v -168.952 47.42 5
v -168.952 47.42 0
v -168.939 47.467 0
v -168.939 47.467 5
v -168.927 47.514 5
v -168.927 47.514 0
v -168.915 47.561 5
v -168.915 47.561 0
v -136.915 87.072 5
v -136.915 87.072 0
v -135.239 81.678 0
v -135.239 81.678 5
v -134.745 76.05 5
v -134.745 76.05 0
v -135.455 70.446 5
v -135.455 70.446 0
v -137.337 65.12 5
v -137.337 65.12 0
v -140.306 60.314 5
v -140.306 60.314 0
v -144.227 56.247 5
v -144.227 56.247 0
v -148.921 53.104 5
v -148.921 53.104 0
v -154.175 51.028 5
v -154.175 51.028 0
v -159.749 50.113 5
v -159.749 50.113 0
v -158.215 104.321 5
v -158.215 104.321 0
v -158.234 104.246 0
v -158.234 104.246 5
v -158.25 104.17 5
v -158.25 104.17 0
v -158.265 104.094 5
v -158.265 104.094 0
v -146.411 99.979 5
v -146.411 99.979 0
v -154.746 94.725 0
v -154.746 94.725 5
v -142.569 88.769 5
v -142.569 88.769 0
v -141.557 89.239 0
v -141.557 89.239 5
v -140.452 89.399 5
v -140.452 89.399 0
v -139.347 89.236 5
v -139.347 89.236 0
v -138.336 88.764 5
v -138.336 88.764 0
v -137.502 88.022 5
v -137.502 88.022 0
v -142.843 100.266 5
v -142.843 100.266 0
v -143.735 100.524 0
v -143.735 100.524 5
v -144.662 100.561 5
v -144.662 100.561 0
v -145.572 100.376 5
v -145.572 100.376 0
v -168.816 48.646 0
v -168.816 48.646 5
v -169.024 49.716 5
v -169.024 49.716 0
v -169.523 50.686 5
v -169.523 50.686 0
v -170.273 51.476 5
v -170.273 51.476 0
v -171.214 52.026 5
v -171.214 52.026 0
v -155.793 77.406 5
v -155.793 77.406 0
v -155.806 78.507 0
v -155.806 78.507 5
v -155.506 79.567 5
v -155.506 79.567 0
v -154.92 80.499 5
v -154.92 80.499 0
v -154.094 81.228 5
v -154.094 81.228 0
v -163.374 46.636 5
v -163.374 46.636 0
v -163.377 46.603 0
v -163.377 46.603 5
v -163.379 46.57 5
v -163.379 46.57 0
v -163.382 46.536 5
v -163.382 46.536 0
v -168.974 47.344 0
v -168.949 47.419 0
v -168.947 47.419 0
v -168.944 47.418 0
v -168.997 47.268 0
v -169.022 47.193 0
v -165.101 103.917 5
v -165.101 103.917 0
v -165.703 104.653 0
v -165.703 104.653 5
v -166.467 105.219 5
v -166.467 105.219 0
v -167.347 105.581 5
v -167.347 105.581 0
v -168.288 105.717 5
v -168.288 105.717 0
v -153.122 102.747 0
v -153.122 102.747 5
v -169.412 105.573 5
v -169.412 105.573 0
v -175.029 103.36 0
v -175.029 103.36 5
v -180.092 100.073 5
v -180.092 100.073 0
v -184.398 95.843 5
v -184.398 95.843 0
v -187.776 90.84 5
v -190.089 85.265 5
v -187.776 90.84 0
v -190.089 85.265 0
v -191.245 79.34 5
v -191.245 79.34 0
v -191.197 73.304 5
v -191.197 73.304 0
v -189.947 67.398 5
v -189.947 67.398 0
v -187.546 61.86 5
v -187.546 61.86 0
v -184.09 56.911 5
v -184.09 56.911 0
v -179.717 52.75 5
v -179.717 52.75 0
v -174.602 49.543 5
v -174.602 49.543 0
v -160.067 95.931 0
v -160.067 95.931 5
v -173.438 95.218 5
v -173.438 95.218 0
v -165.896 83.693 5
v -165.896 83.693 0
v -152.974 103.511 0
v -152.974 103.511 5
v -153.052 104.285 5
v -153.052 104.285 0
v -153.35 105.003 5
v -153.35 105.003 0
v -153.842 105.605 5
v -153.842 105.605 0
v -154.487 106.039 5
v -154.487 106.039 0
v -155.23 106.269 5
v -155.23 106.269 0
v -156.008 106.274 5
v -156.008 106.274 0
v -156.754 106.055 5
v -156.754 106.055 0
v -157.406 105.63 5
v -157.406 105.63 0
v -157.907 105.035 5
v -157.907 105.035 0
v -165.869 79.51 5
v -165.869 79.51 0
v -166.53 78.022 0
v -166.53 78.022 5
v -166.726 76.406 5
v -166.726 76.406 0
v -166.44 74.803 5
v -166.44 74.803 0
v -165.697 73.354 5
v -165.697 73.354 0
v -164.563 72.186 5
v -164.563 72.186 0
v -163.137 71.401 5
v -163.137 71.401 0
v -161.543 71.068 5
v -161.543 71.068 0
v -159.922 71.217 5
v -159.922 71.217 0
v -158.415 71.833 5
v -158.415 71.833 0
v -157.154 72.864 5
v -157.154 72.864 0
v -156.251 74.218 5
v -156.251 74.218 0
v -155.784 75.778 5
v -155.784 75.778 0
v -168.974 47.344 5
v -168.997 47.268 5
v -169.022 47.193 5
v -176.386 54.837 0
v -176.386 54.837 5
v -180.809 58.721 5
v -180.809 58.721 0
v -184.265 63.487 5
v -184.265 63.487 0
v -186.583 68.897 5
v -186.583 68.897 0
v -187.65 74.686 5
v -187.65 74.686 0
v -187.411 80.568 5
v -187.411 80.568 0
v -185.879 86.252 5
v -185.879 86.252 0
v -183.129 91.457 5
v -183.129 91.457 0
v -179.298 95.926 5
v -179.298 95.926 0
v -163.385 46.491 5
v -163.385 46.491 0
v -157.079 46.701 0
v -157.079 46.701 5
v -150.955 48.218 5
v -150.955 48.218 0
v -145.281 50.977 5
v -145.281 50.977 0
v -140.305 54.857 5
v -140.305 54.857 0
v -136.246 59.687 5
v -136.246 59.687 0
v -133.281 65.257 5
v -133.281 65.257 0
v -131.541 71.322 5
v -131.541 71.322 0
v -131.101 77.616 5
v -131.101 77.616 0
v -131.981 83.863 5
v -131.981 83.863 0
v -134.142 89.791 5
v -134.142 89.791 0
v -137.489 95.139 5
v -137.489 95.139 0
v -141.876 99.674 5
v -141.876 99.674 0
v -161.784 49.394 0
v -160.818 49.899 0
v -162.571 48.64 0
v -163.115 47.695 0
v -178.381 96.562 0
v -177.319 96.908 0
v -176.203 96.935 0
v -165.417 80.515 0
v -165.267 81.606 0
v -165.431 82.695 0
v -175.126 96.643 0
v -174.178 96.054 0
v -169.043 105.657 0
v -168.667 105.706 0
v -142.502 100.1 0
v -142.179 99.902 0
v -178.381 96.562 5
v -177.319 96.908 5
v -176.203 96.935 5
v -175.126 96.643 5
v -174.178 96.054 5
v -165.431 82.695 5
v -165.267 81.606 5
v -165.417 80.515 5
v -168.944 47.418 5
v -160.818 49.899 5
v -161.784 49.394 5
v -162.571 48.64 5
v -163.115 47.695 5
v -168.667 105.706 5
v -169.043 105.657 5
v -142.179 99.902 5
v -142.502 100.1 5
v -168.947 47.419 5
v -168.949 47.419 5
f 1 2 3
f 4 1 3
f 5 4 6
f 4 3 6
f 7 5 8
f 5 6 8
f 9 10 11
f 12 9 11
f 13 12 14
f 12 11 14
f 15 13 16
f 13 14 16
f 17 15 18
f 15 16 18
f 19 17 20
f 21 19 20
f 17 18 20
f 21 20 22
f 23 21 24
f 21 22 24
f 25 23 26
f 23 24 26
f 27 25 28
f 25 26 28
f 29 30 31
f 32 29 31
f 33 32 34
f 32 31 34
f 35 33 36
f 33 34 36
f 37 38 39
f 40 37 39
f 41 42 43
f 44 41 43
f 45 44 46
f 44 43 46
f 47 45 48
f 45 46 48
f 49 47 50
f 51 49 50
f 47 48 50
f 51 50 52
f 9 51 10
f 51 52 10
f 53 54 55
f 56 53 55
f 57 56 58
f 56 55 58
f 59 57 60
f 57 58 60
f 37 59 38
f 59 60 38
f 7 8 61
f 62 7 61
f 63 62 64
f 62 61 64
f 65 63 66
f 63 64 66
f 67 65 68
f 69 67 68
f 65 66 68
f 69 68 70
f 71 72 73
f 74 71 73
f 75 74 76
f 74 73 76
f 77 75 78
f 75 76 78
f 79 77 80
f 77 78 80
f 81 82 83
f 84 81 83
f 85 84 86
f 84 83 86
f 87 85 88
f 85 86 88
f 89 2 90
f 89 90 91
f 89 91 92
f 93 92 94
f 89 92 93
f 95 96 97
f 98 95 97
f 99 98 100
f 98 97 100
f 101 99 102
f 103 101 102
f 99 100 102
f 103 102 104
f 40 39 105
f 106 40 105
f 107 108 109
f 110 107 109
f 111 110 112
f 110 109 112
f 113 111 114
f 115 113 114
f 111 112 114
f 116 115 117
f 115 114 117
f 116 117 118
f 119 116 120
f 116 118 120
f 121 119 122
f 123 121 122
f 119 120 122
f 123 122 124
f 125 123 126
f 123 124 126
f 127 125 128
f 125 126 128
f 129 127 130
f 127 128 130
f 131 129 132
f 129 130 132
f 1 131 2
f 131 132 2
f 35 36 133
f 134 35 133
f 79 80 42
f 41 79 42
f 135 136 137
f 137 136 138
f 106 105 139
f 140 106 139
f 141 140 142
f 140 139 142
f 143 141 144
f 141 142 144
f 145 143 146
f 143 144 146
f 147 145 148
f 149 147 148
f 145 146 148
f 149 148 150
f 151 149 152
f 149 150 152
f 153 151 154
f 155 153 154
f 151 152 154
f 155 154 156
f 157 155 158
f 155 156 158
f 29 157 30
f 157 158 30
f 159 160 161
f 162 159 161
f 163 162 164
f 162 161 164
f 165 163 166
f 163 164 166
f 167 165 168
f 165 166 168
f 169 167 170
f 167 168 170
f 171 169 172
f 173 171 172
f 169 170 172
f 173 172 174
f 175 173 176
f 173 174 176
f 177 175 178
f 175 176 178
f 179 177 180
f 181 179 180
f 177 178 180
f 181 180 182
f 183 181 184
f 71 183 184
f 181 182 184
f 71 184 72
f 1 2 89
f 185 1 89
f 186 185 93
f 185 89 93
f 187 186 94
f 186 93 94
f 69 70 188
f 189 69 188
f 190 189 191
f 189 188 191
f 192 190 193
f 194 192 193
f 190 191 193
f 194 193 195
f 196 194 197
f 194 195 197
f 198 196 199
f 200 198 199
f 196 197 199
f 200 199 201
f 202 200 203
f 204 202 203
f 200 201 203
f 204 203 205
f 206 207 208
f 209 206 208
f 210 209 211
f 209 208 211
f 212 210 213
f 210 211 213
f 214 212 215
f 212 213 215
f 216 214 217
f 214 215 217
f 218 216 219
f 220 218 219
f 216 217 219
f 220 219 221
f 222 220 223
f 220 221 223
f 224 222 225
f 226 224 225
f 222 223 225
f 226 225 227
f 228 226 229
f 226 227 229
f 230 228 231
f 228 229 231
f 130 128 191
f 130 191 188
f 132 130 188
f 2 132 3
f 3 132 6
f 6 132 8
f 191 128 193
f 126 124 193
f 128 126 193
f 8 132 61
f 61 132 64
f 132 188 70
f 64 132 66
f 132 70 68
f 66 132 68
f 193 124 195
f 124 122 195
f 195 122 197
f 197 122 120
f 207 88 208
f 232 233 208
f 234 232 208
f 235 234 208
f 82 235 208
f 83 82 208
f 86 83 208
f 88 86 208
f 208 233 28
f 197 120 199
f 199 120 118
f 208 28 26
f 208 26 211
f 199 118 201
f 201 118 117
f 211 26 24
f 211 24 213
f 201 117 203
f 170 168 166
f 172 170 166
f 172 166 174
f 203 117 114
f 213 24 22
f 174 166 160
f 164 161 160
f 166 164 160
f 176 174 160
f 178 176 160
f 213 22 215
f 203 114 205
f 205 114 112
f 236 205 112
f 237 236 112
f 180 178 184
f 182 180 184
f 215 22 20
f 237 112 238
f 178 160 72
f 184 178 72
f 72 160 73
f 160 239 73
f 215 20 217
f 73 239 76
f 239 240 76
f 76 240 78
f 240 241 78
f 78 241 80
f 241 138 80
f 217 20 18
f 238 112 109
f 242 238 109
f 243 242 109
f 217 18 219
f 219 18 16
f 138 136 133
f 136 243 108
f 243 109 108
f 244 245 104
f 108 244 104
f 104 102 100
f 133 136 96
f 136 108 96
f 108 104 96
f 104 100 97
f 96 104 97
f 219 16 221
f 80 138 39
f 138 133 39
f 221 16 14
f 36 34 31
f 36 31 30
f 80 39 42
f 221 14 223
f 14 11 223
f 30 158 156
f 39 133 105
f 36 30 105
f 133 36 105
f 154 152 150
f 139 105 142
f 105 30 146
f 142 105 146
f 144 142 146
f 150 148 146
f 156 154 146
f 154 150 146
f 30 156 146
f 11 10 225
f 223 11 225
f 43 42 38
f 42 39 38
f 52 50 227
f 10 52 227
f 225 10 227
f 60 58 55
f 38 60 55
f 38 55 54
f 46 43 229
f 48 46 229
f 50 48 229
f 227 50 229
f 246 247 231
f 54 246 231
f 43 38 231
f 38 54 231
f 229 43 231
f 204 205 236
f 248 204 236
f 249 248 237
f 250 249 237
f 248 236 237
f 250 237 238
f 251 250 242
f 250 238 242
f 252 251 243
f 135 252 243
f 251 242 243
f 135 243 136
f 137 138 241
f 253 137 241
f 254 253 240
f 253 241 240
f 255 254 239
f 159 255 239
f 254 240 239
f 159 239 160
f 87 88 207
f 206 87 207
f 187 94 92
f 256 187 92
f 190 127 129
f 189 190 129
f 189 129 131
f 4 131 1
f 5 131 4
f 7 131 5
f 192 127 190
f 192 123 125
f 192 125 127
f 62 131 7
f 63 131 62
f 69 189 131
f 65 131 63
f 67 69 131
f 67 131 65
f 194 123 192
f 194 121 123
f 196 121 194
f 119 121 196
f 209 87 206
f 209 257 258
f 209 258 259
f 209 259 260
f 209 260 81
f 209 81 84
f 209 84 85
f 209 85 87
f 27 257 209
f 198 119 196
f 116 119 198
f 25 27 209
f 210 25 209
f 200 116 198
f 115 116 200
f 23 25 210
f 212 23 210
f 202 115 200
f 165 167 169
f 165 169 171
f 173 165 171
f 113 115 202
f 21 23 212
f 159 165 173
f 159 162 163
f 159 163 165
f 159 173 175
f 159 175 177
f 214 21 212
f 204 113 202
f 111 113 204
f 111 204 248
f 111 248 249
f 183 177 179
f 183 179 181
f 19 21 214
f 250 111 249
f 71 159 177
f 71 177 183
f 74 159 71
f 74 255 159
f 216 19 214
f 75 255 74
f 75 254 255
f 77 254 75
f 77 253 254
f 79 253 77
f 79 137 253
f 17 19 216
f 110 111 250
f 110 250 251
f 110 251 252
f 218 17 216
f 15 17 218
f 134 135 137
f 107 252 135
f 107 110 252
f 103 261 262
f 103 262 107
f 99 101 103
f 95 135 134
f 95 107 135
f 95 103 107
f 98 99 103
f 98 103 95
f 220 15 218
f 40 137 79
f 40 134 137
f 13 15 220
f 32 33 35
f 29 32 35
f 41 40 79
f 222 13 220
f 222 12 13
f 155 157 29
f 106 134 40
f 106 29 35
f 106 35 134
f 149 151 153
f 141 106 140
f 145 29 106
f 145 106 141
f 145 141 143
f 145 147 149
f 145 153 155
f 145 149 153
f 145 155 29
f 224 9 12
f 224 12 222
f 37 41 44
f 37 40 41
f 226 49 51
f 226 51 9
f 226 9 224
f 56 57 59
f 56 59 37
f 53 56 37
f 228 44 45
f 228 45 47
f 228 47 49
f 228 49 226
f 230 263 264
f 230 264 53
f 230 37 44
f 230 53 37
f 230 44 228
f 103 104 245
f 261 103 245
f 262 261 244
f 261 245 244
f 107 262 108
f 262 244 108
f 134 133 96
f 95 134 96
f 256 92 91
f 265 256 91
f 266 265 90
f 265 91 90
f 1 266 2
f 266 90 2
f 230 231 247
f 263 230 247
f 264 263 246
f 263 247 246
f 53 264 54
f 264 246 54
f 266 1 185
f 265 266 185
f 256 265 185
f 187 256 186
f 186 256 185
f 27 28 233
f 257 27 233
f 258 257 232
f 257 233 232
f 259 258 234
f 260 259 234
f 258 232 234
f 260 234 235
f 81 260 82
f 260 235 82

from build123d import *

# Parameters (mm, degrees)
F1_DEPTH = 5


with BuildPart() as f1:
    # F0 (on Top) → F1 (new body)
    with BuildSketch(Plane.XY):
        with BuildLine():
            Line((-163.381988, 46.536467), (-163.385242, 46.491124))
            ThreePointArc((-163.385242, 46.491124), (-133.281303, 65.256861), (-141.876481, 99.673761))
            ThreePointArc((-141.876481, 99.673761), (-142.337813, 100.005423), (-142.842853, 100.265736))
            ThreePointArc((-142.842853, 100.265736), (-133.210619, 65.833675), (-163.373536, 46.636144))
            ThreePointArc((-163.373536, 46.636144), (-163.378085, 46.586333), (-163.381988, 46.536467))
        make_face()
        with BuildLine():
            ThreePointArc((-168.9444, 47.418202), (-168.947955, 47.419144), (-168.951509, 47.420086))
            ThreePointArc((-168.951509, 47.420086), (-168.985109, 47.305972), (-169.022211, 47.192949))
            Line((-169.022211, 47.192949), (-168.9444, 47.418202))
        make_face()
        with BuildLine():
            ThreePointArc((-163.373536, 46.636144), (-133.210619, 65.833675), (-142.842853, 100.265736))
            ThreePointArc((-142.842853, 100.265736), (-144.661973, 100.561266), (-146.410639, 99.979284))
            Line((-146.410639, 99.979284), (-154.74582, 94.725046))
            Line((-154.74582, 94.725046), (-153.122208, 102.747463))
            ThreePointArc((-153.122208, 102.747463), (-154.850541, 106.181119), (-158.214688, 104.321107))
            Line((-158.214688, 104.321107), (-158.264877, 104.093805))
            Line((-158.264877, 104.093805), (-160.067137, 95.931475))
            Line((-160.067137, 95.931475), (-165.100747, 103.916657))
            ThreePointArc((-165.100747, 103.916657), (-166.467338, 105.218717), (-168.288042, 105.716684))
            ThreePointArc((-168.288042, 105.716684), (-191.226027, 76.882824), (-168.915222, 47.560978))
            ThreePointArc((-168.915222, 47.560978), (-169.238771, 50.218734), (-171.214242, 52.025904))
            ThreePointArc((-171.214242, 52.025904), (-187.277826, 71.762209), (-179.298415, 95.926014))
            ThreePointArc((-179.298415, 95.926014), (-176.203345, 96.935434), (-173.437857, 95.217742))
            Line((-173.437857, 95.217742), (-165.89632, 83.693394))
            ThreePointArc((-165.89632, 83.693394), (-165.266574, 81.605971), (-165.868951, 79.510486))
            ThreePointArc((-165.868951, 79.510486), (-162.352429, 71.175522), (-155.793288, 77.405707))
            ThreePointArc((-155.793288, 77.405707), (-155.506415, 79.567101), (-154.093685, 81.227856))
            Line((-154.093685, 81.227856), (-142.569337, 88.769393))
            ThreePointArc((-142.569337, 88.769393), (-139.347483, 89.236346), (-136.915339, 87.072306))
            ThreePointArc((-136.915339, 87.072306), (-138.693312, 62.637539), (-159.749042, 50.112553))
            ThreePointArc((-159.749042, 50.112553), (-162.204357, 49.044809), (-163.373536, 46.636144))
        make_face()
        with BuildLine():
            Line((-158.264877, 104.093805), (-158.214688, 104.321107))
            ThreePointArc((-158.214688, 104.321107), (-158.242264, 104.208004), (-158.264877, 104.093805))
        make_face()
        with BuildLine():
            ThreePointArc((-168.915222, 47.560978), (-191.226027, 76.882824), (-168.288042, 105.716684))
            ThreePointArc((-168.288042, 105.716684), (-168.855397, 105.686103), (-169.412109, 105.572529))
            ThreePointArc((-169.412109, 105.572529), (-191.372313, 76.320546), (-168.951509, 47.420086))
            ThreePointArc((-168.951509, 47.420086), (-168.932701, 47.490361), (-168.915222, 47.560978))
        make_face()
    extrude(amount=F1_DEPTH)


solid = f1.part
